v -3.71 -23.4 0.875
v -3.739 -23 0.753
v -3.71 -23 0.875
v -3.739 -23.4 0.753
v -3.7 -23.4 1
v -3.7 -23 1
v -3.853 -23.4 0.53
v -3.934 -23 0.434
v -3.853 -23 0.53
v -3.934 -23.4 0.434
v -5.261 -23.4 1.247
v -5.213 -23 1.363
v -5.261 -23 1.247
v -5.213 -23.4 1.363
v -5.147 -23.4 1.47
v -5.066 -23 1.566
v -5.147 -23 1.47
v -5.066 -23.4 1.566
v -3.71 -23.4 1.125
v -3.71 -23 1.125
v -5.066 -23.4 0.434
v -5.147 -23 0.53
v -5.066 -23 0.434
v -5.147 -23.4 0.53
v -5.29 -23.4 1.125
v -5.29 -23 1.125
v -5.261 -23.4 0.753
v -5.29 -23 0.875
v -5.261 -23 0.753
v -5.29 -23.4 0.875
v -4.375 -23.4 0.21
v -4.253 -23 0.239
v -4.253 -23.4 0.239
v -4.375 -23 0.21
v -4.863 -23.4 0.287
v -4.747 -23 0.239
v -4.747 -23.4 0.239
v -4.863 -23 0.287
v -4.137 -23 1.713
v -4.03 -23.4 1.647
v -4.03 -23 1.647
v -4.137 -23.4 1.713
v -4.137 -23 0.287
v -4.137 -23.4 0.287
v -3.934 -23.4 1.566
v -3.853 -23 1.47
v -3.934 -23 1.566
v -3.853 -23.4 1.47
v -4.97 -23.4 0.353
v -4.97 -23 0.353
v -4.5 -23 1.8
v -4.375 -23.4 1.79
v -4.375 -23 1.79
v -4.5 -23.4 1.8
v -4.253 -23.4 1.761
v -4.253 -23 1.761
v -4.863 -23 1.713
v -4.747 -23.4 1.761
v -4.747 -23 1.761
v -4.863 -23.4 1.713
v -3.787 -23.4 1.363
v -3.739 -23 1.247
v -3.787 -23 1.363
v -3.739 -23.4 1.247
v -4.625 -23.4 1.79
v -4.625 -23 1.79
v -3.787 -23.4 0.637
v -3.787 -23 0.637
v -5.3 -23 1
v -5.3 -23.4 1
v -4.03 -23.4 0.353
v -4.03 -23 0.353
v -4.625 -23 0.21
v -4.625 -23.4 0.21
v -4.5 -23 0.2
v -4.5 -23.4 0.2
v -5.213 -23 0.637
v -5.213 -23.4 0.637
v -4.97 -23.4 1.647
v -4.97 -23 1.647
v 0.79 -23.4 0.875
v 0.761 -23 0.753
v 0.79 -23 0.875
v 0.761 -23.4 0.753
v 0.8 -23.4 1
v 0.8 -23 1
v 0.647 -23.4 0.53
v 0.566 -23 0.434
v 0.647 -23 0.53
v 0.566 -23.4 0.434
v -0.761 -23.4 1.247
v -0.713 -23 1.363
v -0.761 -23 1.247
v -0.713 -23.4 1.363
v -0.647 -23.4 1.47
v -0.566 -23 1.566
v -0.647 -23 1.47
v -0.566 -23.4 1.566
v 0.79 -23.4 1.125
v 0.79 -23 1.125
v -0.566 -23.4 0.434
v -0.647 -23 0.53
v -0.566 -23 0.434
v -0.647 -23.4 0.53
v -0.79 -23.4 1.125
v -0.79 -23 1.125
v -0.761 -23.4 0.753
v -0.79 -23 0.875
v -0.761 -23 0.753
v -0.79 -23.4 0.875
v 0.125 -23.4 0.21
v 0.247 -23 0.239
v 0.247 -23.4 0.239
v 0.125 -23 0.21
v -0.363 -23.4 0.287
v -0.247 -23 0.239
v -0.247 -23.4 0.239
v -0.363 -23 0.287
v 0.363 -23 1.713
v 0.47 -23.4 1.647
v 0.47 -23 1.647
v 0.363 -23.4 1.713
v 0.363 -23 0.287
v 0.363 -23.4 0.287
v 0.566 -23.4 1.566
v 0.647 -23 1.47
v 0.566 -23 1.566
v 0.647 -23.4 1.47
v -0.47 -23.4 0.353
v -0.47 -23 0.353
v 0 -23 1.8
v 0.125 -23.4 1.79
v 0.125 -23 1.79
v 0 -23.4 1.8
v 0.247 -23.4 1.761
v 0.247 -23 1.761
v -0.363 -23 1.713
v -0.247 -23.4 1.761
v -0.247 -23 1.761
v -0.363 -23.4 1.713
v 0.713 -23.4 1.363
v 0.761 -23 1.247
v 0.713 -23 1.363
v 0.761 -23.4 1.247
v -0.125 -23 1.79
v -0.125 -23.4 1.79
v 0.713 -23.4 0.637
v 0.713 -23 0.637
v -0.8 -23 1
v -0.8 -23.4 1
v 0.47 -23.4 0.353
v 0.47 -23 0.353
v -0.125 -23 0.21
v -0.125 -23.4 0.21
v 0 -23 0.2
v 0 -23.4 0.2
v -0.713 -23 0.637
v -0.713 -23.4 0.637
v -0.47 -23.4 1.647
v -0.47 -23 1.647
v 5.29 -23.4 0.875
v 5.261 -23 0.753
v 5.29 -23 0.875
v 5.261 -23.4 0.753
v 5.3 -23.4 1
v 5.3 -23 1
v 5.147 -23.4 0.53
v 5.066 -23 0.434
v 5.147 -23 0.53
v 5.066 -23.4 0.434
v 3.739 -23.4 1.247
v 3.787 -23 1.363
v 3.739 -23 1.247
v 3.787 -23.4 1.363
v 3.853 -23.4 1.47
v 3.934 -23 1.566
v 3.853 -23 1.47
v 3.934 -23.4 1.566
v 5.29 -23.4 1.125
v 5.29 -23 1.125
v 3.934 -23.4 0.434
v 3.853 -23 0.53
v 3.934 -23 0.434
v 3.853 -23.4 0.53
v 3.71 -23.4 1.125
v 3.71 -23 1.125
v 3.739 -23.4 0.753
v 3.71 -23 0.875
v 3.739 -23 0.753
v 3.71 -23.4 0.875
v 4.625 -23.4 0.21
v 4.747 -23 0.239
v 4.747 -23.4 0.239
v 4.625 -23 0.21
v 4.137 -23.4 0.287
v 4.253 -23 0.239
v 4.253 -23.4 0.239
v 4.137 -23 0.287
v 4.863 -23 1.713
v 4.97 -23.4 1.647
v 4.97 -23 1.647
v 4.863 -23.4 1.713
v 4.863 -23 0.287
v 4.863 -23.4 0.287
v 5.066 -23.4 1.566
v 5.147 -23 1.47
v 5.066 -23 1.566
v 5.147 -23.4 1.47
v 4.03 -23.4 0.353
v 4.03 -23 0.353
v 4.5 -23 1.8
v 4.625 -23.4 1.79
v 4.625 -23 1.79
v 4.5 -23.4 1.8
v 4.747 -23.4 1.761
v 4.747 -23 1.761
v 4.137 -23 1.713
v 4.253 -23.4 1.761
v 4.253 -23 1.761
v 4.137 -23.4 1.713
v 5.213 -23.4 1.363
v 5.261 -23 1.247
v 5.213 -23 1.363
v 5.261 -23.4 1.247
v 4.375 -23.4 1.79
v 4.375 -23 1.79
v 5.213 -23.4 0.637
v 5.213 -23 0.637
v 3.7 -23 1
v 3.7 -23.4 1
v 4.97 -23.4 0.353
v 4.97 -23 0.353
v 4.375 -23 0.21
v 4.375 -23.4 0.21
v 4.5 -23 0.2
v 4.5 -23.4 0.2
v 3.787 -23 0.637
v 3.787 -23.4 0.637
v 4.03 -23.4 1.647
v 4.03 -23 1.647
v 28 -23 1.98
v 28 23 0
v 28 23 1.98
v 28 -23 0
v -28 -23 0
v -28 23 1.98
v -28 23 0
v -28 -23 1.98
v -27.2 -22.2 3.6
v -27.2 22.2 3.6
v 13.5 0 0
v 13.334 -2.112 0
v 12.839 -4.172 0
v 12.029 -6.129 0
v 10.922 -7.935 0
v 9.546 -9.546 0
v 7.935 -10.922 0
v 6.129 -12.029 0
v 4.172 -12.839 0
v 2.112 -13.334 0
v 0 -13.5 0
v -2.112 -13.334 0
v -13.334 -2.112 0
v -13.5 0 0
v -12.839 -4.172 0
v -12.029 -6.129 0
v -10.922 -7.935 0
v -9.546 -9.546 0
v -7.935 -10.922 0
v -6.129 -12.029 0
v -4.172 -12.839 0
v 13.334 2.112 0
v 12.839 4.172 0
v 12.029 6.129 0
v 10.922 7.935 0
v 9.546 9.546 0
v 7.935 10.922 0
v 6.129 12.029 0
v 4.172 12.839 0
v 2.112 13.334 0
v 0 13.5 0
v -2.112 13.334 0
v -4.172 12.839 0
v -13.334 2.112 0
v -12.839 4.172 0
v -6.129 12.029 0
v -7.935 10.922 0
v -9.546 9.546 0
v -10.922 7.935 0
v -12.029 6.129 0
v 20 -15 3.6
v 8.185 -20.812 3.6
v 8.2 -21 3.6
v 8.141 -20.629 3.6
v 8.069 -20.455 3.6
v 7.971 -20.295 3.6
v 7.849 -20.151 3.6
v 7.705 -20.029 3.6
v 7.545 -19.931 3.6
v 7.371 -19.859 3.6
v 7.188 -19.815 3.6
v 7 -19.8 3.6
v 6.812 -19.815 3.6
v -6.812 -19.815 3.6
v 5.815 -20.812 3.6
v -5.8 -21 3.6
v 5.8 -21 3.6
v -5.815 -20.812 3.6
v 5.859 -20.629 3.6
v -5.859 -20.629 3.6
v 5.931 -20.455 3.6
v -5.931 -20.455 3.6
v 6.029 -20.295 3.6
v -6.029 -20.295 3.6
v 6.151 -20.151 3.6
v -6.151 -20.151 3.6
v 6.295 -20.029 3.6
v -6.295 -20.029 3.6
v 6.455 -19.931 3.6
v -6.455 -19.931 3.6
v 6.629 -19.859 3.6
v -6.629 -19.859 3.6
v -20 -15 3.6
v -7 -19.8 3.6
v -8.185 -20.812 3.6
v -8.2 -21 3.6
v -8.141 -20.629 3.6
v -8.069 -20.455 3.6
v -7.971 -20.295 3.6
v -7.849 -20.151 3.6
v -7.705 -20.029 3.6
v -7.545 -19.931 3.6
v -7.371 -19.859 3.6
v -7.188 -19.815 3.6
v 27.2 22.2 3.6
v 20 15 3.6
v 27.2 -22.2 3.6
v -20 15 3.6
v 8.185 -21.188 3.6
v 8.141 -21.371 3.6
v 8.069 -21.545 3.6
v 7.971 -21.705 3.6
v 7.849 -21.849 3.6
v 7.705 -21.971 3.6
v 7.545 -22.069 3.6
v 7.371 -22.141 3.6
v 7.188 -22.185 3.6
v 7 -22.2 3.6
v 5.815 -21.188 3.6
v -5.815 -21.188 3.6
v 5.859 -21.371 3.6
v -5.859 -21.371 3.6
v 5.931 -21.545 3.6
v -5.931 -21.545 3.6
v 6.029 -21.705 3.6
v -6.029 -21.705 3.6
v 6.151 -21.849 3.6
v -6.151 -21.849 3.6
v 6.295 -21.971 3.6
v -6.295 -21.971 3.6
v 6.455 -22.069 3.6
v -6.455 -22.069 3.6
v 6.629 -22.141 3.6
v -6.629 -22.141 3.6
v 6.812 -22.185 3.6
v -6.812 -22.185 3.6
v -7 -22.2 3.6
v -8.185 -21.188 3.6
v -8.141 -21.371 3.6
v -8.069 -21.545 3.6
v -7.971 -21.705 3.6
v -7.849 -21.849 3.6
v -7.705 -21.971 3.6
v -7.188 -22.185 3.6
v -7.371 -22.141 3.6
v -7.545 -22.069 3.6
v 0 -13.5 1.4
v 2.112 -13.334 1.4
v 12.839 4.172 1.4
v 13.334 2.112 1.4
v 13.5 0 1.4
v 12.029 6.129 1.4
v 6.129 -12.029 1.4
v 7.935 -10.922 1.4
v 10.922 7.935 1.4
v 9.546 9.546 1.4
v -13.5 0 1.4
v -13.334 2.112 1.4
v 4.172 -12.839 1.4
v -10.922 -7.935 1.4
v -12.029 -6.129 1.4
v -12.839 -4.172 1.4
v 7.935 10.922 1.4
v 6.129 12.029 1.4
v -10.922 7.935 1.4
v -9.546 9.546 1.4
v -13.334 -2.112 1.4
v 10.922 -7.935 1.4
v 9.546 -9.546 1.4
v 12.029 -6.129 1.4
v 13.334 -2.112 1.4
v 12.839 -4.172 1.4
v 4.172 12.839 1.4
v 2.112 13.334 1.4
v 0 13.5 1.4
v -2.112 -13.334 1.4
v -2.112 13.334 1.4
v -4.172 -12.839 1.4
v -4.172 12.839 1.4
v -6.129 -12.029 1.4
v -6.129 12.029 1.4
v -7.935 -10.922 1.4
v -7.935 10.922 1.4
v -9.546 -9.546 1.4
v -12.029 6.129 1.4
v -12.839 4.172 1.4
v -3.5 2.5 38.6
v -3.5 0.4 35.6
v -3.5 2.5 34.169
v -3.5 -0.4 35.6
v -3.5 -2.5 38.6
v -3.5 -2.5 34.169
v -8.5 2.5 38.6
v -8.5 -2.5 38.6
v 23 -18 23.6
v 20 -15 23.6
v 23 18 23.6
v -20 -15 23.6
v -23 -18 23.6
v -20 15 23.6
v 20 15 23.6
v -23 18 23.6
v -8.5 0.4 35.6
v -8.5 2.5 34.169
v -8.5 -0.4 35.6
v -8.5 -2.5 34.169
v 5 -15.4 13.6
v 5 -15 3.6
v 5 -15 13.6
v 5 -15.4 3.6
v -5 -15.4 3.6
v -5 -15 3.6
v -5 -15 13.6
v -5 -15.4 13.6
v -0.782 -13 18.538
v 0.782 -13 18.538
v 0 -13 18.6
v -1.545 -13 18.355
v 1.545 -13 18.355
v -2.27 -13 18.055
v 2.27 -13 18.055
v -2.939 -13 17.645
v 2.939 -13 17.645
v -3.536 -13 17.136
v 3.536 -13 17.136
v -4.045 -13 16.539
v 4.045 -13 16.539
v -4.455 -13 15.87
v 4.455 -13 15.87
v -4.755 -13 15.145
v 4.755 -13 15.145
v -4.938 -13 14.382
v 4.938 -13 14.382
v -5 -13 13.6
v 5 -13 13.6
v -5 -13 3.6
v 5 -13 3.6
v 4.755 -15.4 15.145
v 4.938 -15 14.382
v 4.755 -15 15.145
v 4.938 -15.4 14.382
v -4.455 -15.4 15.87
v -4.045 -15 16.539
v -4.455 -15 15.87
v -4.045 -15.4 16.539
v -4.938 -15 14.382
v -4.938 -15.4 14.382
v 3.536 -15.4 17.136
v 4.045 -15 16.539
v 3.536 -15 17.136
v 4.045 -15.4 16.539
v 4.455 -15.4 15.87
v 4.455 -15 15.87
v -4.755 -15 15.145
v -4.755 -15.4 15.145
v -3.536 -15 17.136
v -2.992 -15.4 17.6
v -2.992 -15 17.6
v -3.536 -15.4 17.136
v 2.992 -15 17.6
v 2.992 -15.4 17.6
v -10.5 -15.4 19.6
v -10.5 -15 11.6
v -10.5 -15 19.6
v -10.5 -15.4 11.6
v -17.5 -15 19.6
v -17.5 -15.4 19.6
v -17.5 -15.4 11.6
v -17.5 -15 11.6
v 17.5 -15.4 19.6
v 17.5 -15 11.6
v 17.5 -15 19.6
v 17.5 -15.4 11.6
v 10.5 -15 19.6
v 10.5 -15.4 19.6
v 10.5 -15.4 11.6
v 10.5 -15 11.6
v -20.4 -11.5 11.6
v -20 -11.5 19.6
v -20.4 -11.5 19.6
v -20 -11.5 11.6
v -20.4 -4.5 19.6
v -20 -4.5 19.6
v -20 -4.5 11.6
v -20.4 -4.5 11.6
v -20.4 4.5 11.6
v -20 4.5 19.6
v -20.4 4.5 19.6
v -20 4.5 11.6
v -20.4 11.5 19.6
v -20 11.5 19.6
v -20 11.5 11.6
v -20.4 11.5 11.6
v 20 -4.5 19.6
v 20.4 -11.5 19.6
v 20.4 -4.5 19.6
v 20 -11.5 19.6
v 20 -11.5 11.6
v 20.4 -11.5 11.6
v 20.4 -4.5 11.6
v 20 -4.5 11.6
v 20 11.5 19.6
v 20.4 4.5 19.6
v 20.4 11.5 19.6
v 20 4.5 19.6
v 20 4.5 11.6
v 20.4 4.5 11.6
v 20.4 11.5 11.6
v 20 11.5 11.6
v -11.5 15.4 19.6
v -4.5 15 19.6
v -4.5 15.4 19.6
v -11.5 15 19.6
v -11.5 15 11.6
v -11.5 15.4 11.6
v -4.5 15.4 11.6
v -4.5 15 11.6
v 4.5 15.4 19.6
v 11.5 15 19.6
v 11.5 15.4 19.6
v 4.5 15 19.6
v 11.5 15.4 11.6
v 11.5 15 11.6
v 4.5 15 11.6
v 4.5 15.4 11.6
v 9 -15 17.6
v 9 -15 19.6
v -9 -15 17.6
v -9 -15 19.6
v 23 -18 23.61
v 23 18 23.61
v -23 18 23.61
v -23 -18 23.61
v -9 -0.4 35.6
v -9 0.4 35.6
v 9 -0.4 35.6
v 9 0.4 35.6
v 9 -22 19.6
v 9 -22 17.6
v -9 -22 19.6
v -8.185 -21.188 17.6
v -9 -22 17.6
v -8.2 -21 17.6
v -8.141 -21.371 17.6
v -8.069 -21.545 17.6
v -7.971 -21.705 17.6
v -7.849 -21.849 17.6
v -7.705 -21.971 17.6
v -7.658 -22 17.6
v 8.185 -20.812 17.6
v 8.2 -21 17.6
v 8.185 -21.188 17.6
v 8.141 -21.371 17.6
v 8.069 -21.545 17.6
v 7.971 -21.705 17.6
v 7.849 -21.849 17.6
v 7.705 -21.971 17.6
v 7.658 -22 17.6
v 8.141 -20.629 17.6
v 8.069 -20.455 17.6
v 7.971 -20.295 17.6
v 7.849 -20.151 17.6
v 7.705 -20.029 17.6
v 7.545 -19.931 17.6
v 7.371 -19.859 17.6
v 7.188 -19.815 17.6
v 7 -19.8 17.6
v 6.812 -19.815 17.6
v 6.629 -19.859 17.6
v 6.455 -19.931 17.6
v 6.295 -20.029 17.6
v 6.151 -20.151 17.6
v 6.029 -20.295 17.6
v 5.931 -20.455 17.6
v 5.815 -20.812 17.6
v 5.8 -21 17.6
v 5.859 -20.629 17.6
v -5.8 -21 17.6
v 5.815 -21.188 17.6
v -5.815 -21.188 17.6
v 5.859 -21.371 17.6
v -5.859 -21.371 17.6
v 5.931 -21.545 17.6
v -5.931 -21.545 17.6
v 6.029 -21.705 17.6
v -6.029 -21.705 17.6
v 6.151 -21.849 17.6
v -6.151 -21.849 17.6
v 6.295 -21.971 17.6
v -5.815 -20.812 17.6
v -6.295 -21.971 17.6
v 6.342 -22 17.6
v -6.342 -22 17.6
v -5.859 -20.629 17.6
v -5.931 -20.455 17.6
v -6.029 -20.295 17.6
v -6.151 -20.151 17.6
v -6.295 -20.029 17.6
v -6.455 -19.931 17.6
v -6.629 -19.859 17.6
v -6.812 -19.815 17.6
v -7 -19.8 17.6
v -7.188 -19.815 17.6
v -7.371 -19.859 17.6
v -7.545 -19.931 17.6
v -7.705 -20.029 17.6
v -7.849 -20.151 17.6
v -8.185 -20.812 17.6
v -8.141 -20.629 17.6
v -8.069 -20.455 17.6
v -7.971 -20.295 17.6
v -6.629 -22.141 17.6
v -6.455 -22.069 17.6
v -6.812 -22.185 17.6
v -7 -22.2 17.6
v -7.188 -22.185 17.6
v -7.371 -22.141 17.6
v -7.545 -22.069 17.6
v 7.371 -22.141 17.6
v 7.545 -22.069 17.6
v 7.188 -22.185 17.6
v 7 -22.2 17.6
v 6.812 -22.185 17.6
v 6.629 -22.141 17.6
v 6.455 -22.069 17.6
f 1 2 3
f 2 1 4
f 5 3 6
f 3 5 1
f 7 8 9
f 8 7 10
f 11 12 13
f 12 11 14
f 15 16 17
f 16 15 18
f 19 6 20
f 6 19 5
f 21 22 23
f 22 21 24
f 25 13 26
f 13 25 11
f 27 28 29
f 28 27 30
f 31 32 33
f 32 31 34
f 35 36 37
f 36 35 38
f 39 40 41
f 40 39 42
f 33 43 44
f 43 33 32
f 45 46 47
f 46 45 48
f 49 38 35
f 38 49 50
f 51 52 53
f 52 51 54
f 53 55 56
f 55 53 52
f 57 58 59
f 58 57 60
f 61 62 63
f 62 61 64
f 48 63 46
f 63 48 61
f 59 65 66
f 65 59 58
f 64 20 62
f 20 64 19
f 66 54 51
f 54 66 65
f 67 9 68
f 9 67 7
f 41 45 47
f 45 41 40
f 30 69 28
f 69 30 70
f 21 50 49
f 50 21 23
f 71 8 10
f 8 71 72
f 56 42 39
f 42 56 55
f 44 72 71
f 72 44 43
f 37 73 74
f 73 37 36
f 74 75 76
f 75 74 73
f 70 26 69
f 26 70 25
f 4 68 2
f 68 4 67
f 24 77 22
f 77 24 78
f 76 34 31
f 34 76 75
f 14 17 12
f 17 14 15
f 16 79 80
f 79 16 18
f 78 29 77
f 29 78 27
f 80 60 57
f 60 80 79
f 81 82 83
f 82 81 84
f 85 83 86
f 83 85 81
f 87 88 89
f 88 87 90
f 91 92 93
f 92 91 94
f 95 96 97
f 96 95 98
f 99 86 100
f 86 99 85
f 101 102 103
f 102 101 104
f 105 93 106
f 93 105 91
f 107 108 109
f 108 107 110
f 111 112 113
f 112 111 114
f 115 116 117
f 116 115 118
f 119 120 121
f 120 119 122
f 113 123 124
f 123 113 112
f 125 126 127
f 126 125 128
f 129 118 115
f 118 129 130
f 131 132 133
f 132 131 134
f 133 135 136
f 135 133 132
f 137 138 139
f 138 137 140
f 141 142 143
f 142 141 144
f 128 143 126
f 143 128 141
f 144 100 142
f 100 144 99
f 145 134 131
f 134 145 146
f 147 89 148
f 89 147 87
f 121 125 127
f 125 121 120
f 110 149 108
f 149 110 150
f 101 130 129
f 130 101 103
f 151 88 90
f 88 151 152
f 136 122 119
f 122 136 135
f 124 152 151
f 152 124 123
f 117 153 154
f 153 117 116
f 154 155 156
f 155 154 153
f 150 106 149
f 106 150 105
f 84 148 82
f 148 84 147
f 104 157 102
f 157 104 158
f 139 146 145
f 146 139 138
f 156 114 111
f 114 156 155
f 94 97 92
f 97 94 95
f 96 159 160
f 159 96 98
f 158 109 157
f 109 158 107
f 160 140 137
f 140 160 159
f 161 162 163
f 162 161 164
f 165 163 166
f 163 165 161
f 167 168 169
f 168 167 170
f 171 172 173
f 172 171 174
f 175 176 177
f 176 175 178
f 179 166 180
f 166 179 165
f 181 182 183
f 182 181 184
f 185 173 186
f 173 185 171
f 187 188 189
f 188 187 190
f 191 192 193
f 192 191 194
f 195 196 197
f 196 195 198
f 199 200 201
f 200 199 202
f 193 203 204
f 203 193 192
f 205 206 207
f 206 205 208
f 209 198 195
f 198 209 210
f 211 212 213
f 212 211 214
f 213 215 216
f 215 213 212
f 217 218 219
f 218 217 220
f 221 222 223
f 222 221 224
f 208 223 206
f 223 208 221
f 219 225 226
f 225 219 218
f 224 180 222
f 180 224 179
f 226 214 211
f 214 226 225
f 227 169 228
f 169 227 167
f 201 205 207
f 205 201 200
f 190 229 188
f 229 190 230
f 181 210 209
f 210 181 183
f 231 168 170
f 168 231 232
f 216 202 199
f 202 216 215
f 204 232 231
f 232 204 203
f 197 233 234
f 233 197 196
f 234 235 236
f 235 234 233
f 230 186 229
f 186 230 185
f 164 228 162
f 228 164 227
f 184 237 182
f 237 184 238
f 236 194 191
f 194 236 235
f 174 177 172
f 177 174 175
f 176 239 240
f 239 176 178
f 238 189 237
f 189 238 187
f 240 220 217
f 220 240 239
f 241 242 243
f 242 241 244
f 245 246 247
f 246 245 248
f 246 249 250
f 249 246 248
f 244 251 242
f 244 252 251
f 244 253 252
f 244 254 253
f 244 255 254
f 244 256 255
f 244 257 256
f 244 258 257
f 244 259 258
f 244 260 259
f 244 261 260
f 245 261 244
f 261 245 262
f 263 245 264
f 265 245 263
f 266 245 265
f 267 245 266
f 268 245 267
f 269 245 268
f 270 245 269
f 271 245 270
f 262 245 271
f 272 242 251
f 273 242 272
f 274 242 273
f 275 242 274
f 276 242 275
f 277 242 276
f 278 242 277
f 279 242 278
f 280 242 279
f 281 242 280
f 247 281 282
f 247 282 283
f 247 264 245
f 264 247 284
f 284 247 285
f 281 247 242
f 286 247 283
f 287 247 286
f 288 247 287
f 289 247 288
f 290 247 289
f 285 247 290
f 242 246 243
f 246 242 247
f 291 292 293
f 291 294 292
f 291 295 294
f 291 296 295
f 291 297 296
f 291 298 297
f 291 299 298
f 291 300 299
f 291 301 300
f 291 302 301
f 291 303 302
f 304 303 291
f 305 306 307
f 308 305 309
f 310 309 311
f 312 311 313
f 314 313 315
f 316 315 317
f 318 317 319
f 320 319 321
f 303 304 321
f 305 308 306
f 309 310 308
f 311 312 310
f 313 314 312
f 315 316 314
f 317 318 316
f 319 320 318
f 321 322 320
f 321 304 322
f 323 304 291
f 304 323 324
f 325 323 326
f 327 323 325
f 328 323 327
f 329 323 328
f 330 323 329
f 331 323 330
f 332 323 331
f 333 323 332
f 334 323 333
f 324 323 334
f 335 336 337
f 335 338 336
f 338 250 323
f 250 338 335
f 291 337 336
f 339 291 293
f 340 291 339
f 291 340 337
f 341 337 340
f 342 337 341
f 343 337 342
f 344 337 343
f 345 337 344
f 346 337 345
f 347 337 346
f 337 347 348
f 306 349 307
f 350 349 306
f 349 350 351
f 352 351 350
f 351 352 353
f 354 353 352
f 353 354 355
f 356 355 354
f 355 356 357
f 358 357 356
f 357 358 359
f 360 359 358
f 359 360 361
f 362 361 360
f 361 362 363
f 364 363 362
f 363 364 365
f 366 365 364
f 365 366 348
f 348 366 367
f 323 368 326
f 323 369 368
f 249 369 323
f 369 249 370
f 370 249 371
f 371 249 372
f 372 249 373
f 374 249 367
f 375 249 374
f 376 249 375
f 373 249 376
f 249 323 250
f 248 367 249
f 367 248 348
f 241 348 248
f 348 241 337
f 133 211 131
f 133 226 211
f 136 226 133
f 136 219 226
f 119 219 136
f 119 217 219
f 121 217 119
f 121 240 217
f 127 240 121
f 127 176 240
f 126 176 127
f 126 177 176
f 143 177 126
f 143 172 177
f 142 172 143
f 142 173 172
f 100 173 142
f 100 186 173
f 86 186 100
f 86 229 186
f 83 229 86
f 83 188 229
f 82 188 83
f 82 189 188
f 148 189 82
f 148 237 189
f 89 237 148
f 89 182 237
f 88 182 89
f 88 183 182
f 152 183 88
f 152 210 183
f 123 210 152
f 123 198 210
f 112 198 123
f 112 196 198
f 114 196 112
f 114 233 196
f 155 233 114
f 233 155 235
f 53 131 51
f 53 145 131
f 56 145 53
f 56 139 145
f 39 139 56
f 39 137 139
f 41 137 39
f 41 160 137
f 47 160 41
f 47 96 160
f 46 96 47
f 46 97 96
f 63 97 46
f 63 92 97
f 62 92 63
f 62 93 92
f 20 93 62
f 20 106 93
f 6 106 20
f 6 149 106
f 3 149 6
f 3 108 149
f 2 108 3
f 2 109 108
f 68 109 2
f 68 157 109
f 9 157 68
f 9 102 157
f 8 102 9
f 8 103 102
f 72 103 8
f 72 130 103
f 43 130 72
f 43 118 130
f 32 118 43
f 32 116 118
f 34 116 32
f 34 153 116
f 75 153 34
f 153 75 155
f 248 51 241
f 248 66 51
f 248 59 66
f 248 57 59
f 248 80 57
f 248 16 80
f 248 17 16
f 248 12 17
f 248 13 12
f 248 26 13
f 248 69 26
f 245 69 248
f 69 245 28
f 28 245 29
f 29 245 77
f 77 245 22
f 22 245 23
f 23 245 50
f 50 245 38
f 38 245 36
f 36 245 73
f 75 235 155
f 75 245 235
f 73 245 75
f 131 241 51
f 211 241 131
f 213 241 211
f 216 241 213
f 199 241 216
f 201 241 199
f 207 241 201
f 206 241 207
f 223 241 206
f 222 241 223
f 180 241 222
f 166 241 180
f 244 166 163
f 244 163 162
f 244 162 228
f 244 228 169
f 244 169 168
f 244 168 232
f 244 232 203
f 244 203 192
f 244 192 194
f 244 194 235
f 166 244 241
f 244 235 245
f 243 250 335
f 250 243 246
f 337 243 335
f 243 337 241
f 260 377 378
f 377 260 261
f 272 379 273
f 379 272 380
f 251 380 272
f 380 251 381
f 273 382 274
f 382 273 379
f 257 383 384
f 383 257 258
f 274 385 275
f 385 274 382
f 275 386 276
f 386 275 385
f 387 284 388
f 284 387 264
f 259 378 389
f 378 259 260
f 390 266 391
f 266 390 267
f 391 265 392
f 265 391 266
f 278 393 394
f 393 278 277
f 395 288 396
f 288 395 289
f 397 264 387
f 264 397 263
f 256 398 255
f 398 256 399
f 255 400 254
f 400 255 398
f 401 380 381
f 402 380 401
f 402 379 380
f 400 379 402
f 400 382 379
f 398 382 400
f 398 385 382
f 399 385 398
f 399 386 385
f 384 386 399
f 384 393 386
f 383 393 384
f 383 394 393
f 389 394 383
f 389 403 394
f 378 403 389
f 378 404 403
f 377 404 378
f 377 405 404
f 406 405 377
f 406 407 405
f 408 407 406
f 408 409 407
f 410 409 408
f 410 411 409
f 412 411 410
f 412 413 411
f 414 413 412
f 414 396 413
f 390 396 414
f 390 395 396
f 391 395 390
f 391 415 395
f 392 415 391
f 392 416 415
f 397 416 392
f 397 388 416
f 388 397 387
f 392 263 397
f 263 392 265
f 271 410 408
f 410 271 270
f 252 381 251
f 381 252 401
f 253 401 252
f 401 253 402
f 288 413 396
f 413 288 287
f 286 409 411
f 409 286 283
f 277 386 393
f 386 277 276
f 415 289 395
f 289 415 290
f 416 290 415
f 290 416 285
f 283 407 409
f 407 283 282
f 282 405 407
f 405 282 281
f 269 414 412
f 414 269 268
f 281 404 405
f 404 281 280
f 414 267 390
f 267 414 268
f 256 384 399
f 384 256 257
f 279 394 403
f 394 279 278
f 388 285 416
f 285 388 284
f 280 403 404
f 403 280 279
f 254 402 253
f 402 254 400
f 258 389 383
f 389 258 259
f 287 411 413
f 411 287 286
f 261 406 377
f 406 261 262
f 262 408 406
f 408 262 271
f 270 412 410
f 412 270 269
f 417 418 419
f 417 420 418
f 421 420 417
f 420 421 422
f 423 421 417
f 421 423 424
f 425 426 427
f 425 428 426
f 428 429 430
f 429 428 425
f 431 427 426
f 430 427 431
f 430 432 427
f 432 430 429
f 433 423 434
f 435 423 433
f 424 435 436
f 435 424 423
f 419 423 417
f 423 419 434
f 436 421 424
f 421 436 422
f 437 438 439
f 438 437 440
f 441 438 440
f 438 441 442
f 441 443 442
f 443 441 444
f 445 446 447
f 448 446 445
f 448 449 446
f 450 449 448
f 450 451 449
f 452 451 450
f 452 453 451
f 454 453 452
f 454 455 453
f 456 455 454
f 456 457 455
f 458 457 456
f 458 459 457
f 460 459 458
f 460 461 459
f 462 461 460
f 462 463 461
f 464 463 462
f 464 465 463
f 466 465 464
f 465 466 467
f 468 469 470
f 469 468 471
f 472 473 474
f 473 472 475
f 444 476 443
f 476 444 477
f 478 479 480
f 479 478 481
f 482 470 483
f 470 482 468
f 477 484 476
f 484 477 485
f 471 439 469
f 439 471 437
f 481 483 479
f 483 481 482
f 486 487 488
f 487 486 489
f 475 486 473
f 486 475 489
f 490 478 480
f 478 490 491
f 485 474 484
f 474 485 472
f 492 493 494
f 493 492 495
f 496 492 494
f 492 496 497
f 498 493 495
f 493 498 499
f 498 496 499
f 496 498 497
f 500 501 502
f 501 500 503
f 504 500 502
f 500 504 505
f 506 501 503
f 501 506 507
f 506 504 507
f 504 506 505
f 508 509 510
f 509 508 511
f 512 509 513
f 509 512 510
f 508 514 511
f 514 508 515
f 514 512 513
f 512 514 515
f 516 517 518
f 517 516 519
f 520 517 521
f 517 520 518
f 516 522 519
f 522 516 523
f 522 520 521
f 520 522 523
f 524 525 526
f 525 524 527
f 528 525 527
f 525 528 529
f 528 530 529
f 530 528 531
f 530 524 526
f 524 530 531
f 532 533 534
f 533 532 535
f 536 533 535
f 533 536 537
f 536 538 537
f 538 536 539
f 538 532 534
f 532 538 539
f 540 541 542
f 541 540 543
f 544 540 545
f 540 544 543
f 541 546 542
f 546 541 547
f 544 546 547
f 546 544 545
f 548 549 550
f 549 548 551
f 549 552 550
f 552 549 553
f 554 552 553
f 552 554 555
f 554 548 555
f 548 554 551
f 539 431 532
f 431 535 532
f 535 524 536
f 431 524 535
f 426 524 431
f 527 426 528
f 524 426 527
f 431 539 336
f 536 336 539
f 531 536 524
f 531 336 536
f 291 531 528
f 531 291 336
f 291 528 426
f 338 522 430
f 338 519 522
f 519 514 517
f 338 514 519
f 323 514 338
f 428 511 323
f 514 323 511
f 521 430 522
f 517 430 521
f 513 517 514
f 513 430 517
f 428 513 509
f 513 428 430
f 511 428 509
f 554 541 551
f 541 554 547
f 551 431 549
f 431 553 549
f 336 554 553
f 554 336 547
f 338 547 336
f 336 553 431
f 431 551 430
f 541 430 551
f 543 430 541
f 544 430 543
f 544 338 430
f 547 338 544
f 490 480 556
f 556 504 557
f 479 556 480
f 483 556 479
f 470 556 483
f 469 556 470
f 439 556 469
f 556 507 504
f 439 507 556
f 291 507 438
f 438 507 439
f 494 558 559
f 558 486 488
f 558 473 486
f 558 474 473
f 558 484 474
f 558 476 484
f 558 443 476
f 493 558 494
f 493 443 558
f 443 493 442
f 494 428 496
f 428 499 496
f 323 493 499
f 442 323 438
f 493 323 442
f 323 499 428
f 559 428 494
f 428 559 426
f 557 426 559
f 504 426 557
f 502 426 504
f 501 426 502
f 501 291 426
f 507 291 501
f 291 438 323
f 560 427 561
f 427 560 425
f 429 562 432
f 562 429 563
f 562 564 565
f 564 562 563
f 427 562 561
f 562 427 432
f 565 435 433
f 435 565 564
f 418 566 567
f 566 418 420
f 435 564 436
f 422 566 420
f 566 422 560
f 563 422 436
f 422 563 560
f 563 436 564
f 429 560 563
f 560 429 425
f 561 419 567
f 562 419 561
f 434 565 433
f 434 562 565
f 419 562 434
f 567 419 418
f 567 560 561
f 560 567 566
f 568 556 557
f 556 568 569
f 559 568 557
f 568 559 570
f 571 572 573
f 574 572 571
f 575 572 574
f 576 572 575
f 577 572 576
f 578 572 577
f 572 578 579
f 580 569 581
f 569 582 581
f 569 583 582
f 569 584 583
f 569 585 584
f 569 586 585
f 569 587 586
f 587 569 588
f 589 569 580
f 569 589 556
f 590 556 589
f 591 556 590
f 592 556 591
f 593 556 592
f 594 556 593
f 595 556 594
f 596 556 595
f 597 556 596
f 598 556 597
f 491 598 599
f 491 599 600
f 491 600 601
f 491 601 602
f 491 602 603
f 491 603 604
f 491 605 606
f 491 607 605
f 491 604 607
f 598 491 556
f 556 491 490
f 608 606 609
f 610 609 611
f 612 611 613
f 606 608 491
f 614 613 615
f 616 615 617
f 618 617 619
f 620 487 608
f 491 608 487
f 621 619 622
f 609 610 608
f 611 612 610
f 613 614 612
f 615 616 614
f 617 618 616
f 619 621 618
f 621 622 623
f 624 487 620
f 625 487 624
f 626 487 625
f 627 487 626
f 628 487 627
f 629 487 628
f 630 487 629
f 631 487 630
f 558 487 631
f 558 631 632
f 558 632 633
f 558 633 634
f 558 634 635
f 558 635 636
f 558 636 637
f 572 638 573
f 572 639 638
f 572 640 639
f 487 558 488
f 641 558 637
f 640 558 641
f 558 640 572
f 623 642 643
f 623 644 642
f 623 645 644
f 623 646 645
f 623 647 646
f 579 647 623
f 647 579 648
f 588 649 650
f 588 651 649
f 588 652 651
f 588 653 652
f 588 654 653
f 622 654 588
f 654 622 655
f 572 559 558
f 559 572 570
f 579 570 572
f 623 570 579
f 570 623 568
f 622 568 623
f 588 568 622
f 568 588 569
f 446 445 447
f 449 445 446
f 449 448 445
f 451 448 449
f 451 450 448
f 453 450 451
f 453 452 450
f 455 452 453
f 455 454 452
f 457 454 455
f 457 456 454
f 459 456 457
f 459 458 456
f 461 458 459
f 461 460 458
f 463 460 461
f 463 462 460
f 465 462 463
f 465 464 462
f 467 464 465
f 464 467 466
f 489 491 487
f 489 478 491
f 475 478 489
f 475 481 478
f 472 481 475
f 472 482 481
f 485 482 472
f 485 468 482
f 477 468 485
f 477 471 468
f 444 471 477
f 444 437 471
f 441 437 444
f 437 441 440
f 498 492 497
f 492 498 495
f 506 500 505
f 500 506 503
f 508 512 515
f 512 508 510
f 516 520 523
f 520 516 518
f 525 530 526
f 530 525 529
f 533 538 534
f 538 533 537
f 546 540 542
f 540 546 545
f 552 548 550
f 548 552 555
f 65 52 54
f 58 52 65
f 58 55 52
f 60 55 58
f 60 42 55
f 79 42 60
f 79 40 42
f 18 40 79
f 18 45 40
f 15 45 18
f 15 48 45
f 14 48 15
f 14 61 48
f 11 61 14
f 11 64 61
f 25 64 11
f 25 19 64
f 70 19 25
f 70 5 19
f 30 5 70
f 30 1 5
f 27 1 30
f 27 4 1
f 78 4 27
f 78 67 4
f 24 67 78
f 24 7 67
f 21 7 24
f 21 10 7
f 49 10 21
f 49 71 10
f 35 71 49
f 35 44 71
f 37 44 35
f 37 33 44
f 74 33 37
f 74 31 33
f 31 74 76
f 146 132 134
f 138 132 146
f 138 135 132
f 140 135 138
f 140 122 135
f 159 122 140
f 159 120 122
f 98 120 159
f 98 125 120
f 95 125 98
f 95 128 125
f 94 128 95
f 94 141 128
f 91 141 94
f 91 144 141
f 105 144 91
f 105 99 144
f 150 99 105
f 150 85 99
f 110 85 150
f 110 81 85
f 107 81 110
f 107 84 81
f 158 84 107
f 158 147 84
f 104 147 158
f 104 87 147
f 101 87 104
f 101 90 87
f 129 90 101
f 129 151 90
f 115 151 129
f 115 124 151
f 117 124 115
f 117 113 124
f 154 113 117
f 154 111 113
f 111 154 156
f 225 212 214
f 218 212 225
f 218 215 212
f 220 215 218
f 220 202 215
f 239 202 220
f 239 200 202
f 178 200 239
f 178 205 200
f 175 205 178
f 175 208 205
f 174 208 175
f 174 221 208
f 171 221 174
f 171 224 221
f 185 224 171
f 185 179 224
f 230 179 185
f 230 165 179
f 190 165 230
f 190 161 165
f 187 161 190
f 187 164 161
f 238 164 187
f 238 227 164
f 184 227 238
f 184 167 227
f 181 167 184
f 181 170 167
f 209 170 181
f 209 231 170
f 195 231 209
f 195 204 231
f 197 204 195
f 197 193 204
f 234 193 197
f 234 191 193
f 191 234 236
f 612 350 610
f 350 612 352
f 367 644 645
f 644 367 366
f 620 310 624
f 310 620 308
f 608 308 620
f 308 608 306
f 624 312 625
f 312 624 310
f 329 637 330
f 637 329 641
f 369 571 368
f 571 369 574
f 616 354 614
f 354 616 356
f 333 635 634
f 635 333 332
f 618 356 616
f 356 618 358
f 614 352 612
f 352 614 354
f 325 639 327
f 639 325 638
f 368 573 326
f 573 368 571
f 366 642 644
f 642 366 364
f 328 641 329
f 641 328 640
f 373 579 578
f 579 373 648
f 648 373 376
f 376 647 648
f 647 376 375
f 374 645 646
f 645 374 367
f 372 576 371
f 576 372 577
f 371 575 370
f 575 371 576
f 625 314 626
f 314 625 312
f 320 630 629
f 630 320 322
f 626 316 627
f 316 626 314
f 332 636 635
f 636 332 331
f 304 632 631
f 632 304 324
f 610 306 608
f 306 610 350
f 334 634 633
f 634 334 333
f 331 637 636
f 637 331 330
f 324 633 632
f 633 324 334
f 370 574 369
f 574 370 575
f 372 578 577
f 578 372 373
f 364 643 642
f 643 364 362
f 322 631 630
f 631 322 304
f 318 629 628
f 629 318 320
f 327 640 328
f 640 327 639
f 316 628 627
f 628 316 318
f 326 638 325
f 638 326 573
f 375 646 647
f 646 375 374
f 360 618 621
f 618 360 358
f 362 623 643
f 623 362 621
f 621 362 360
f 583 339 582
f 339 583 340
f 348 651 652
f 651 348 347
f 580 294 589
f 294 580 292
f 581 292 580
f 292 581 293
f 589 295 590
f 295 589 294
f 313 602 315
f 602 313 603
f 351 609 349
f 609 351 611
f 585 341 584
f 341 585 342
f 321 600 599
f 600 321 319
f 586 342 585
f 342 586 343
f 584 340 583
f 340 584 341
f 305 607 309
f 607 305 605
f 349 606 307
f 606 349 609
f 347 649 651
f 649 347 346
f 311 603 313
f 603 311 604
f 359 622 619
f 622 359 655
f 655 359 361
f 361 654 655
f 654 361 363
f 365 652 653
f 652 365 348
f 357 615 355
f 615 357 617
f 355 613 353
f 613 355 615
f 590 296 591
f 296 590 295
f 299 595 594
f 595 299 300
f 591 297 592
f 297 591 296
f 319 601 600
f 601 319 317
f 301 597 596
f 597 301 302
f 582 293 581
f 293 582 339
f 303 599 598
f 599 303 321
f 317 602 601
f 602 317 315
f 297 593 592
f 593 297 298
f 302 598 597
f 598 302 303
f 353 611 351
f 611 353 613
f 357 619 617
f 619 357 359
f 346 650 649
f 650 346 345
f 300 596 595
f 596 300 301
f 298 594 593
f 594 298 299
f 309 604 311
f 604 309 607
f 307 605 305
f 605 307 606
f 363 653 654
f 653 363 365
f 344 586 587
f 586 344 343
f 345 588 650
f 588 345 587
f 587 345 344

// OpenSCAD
// file: lib.scad
// BDL Pets - gemeinsame Bausteine fuer die 5 Haus-Stufen
//
// Alle Haeuser sind in genau 4 Farbslots aufgeteilt (Multicolor-Druck, z.B. Bambu AMS / Prusa MMU):
//   1 Stein/Sockel   2 Waende   3 Dach   4 Akzente (Tueren, Fenster, Pfosten, Stufen-Punkte)
// Die Teile ueberlappen nicht (Oeffnungen werden aus der einen Farbe geschnitten und in der anderen gefuellt),
// jeder Farbslot laesst sich einzeln als STL exportieren:  openscad -D part=1 -o x_c1.stl house-1-huette.scad
//   part = 0 -> Vorschau in Farbe, 1..4 -> nur dieser Farbslot
//
// Unten (Sockel) ist mittig eine runde Ausnehmung fuer einen NFC-Sticker (Durchmesser 25 mm) ausgespart:
// Sticker von unten einkleben, buendig mit der Unterseite, 2.2 mm Kunststoff darueber (Lesen durch das Haus).

$fn = 40;

PH = 3.6;           // Sockelhoehe (mm)
NFC_D = 27;         // Ausnehmung: 25 mm Sticker + Spiel
NFC_DEPTH = 1.4;    // Tiefe von unten (NTAG-Sticker ~0.3-0.6 mm dick + Kleber) -> Restdecke = PH - NFC_DEPTH
PALETTE = ["#8c9097", "#eadfc4", "#a5432f", "#33415f"];

module pc(i, part) {
    if (part == 0) color(PALETTE[i - 1]) children();
    else if (part == i) children();
}

// ---------------------------------------------------------------- Sockel (Farbe 1)
module plinth(w, d, tier) {
    difference() {
        hull() {
            translate([-w / 2, -d / 2, 0]) cube([w, d, PH * 0.55]);
            translate([-w / 2 + 0.8, -d / 2 + 0.8, 0]) cube([w - 1.6, d - 1.6, PH]);
        }
        translate([0, 0, -0.01]) cylinder(d = NFC_D, h = NFC_DEPTH + 0.01);   // NFC-Sticker
        tier_dots(w, d, tier, false);
    }
}

// Stufen-Punkte an der Sockel-Vorderseite: 1 Punkt = Huette ... 5 Punkte = Villa (Farbe 4 fuellt sie)
module tier_dots(w, d, tier, fill) {
    for (i = [0 : tier])
        translate([(i - tier / 2) * 4.5, -d / 2 - (fill ? 0.4 : 1), 1.0])
            rotate([-90, 0, 0]) cylinder(d = 1.6, h = fill ? 1.4 : 2);
}

// ---------------------------------------------------------------- Koerper
module box(w, d, h, z0, cx = 0, cy = 0) {
    translate([cx - w / 2, cy - d / 2, z0]) cube([w, d, h]);
}

// Satteldach, First entlang Y (Giebel zeigt nach vorn)
module gable(w, d, h, z0, over, cx = 0, cy = 0) {
    translate([cx, cy + (d + 2 * over) / 2, z0]) rotate([90, 0, 0])
        linear_extrude(d + 2 * over) polygon([[-w / 2 - over, 0], [w / 2 + over, 0], [0, h]]);
}

// Walmdach, First entlang X
module hip(w, d, h, z0, over, ridge, cx = 0, cy = 0) {
    hull() {
        translate([cx - w / 2 - over, cy - d / 2 - over, z0]) cube([w + 2 * over, d + 2 * over, 0.01]);
        translate([cx - ridge / 2, cy - 0.4, z0 + h - 0.01]) cube([ridge, 0.8, 0.01]);
    }
}

// ---------------------------------------------------------------- Oeffnungen (Tueren/Fenster)
// Ursprung = Unterkante Mitte, ragt von der Wandflaeche (y=0) nach innen (+y).
// fill=false: Schneidkoerper (steht 1 mm ueber), fill=true: Einsatz aus Farbe 4 (steht 0.4 mm vor)
module opening(w, h, d = 2, arch = false, fill = false) {
    out = fill ? 0.4 : 1;
    translate([0, -out, 0]) {
        if (arch) {
            translate([-w / 2, 0, 0]) cube([w, out + d, h - w / 2]);
            translate([0, 0, h - w / 2]) rotate([-90, 0, 0]) cylinder(d = w, h = out + d);
        } else {
            translate([-w / 2, 0, 0]) cube([w, out + d, h]);
        }
    }
}

// Auf eine Wand setzen. `face` = Abstand der Wandflaeche von der Mitte
module on_front(x, z, face) { translate([x, -face, z]) children(); }
module on_back(x, z, face) { translate([x, face, z]) rotate([0, 0, 180]) children(); }
module on_left(y, z, face) { translate([-face, y, z]) rotate([0, 0, -90]) children(); }
module on_right(y, z, face) { translate([face, y, z]) rotate([0, 0, 90]) children(); }

module on_side(k, y, z, face) {   // k = 0 links, 1 rechts
    if (k == 0) on_left(y, z, face) children();
    else on_right(y, z, face) children();
}
// main file
// Stufe 3: Cottage - 3 Plaetze, Zufriedenheit -20/Tag. Walmdach, Vordach mit Pfosten, Kamin.
include <lib.scad>

H3_P = [56, 46];
H3_W = 40; H3_D = 30; H3_H = 20; H3_RH = 12; H3_OV = 3;

module h3_openings(fill) {
    z = PH;
    on_front(0, z, H3_D / 2) opening(10, 15, 2, true, fill);
    for (x = [-14, 14]) on_front(x, z + 8, H3_D / 2) opening(7, 8, 2, false, fill);
    for (k = [0, 1], y = [-8, 8]) on_side(k, y, z + 8, H3_W / 2) opening(7, 8, 2, false, fill);
    on_back(-8, z + 8, H3_D / 2) opening(7, 8, 2, false, fill);
    on_back(8, z + 8, H3_D / 2) opening(7, 8, 2, false, fill);
}

module h3_chimney() { box(5, 5, 15, PH + H3_H, -6, 0); }

module house3(part = 0) {
    pc(1, part) { plinth(H3_P[0], H3_P[1], 2); h3_chimney(); }
    pc(2, part) difference() { box(H3_W, H3_D, H3_H, PH); h3_openings(false); }
    pc(3, part) {
        difference() {
            hip(H3_W, H3_D, H3_RH, PH + H3_H, H3_OV, 18);
            h3_chimney();
        }
        box(18, 7, 2, PH + 14, 0, -18.5);   // Vordach ueber der Tuer
    }
    pc(4, part) {
        h3_openings(true);
        tier_dots(H3_P[0], H3_P[1], 2, true);
        for (x = [-7, 7]) translate([x, -21, PH]) cylinder(d = 2.4, h = 14);   // Pfosten
    }
}

part = 0;
house3(part);
